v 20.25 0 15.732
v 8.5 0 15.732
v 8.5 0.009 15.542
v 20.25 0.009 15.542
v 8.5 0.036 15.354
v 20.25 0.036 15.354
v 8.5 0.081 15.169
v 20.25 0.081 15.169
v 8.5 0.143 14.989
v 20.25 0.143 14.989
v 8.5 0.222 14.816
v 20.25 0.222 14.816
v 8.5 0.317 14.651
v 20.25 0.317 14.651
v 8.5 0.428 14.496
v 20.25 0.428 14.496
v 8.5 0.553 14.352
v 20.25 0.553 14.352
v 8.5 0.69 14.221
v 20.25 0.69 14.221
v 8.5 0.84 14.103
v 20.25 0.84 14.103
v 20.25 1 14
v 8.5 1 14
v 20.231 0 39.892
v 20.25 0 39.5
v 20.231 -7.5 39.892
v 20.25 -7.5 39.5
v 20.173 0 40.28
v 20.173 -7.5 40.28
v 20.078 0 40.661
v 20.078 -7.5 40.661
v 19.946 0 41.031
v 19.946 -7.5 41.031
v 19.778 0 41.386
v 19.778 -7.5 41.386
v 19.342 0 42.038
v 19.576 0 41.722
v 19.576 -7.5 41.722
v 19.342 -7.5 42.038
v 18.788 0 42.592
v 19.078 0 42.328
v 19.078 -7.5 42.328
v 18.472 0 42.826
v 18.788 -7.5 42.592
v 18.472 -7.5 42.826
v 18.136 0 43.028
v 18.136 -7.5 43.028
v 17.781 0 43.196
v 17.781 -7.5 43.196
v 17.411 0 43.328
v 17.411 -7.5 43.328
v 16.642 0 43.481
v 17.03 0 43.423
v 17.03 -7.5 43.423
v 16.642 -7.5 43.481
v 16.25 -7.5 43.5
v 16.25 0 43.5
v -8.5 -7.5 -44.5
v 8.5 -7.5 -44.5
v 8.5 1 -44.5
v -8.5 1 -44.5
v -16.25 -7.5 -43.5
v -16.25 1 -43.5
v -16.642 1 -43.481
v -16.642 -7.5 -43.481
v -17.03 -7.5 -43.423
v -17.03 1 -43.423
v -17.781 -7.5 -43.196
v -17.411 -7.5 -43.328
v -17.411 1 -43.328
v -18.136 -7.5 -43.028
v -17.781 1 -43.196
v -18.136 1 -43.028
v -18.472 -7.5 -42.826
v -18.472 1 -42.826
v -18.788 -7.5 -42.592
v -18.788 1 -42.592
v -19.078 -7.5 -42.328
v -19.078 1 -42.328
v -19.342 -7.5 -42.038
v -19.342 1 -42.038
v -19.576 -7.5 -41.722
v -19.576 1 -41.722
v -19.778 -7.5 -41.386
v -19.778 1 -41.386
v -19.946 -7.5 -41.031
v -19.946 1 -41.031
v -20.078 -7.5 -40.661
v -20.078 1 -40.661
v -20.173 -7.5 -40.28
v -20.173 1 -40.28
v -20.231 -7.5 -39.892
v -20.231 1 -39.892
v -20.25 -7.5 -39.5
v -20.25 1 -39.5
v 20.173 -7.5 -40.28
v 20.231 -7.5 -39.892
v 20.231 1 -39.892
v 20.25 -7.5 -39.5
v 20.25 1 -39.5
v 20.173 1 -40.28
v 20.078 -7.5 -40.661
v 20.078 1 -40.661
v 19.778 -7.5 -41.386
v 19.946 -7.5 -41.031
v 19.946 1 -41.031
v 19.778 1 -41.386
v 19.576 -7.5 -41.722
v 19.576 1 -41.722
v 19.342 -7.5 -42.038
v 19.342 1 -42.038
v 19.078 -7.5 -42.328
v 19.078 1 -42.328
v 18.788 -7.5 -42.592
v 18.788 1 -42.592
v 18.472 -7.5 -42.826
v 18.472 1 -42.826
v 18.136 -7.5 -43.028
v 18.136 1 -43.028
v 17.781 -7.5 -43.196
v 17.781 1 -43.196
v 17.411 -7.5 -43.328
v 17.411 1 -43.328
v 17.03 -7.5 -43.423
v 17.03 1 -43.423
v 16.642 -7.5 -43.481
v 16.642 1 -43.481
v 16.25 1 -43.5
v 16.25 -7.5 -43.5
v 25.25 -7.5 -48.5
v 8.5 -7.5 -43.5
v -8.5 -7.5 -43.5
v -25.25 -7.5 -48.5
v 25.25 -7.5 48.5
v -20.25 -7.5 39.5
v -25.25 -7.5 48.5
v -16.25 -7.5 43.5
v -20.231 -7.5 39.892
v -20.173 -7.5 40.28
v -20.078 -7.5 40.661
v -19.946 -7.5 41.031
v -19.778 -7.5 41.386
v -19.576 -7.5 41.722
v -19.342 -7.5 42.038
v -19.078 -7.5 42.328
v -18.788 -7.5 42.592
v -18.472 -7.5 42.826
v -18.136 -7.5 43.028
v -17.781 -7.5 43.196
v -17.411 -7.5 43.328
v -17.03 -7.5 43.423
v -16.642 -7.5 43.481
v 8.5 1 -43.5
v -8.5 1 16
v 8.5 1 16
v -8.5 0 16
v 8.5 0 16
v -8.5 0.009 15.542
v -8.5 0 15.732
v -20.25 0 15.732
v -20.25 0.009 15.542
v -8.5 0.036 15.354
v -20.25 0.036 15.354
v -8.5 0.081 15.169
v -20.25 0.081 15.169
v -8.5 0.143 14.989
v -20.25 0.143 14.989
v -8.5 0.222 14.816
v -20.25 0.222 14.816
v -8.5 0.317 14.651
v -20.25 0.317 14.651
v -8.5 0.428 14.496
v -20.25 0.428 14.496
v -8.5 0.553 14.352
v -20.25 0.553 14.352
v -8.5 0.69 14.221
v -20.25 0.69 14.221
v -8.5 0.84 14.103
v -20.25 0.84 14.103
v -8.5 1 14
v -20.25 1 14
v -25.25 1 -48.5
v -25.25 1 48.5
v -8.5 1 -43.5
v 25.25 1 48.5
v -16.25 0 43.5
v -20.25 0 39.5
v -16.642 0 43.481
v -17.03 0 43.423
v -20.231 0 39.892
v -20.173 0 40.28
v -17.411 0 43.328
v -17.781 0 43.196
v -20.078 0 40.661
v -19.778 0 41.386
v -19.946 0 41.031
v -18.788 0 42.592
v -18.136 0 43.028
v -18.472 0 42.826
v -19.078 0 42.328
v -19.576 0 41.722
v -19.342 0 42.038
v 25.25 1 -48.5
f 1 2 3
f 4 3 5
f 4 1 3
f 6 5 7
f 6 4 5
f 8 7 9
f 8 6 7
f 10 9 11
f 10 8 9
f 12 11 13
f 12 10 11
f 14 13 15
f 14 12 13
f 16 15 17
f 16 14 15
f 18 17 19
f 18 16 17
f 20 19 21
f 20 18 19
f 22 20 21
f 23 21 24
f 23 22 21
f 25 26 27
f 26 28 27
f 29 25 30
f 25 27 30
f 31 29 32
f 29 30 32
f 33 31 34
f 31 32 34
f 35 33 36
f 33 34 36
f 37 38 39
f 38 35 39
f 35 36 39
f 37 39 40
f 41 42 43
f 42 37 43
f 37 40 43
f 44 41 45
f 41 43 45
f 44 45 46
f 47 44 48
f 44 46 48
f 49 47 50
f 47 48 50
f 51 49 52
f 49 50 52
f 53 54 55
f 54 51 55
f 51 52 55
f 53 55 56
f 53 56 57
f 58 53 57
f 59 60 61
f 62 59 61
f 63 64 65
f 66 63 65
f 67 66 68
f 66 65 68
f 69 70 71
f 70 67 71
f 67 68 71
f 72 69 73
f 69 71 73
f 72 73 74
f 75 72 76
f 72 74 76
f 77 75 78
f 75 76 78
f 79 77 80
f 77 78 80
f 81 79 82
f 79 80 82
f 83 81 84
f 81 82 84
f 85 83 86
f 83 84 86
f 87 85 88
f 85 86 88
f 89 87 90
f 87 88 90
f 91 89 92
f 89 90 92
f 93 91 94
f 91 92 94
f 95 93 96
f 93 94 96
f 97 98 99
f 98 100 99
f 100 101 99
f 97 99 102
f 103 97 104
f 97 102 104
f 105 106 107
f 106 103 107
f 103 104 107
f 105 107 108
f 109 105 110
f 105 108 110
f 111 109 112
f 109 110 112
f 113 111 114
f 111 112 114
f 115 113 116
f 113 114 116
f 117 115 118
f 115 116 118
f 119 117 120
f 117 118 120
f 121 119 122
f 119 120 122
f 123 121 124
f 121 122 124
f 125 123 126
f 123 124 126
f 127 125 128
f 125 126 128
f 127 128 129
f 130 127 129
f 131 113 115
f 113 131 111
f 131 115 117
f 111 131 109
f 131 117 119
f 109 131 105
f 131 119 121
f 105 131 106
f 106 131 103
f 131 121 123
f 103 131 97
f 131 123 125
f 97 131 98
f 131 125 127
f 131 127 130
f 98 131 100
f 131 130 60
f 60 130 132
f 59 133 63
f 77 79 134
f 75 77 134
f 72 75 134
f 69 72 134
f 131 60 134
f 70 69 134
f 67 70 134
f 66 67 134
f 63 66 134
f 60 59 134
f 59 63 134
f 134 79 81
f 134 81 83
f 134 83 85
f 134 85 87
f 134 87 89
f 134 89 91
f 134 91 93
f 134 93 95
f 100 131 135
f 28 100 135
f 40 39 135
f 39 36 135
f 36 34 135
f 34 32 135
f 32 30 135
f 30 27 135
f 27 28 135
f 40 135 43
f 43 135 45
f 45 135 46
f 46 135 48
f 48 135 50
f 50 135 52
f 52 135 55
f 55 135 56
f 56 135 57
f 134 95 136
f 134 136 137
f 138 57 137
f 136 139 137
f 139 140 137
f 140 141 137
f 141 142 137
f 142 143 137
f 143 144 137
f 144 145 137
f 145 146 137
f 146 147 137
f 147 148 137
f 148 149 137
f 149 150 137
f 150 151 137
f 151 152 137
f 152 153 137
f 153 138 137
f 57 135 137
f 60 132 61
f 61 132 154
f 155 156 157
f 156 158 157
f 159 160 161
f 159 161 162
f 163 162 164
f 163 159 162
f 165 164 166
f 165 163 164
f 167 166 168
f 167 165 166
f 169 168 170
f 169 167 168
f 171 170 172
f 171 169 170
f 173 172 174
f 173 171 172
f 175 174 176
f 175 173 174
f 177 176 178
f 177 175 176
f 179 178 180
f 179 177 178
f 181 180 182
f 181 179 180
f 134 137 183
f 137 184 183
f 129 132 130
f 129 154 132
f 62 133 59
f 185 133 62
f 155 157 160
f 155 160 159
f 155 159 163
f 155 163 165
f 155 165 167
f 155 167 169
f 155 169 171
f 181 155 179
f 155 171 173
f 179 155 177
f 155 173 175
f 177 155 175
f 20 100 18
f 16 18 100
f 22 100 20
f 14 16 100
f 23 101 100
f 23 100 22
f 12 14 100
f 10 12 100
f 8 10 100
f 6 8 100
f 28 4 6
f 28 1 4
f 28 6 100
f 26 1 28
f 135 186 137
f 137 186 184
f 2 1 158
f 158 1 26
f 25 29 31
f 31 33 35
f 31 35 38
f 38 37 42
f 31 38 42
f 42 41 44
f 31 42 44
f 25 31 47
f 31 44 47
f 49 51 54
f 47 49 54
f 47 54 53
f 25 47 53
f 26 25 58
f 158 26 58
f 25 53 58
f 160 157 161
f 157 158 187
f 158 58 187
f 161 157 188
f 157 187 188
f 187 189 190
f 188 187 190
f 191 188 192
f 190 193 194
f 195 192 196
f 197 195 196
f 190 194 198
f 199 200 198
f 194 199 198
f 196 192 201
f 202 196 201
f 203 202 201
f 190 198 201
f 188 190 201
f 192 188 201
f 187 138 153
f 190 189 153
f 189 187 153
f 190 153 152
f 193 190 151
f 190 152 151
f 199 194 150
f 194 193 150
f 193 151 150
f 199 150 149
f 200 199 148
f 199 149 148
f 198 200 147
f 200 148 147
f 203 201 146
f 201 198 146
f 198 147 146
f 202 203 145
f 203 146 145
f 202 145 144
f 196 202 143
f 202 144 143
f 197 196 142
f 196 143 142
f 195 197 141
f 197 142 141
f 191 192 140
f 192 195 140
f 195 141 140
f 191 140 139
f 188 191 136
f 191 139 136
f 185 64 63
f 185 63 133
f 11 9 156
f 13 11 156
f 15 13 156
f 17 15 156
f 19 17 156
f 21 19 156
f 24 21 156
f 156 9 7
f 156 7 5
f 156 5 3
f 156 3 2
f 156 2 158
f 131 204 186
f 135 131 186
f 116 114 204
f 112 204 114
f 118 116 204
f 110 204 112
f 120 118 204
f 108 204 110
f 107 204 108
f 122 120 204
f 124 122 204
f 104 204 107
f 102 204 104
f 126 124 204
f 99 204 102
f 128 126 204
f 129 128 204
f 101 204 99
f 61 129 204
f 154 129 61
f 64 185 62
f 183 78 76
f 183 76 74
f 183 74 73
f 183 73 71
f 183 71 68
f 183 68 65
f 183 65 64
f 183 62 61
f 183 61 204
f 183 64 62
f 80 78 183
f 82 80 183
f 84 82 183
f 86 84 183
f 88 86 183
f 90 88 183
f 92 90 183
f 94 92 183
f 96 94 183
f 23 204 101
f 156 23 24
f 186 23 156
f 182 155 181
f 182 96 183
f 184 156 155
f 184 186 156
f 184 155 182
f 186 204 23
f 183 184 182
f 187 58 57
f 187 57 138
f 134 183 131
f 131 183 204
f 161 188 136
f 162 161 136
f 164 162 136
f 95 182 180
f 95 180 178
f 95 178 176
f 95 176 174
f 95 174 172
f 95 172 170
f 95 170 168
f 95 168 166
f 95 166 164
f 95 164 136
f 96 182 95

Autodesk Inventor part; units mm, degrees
ref_plane "YZ Plane" through (0, 0, 0) normal (1, 0, 0) x (0, 1, 0)
ref_plane "XZ Plane" through (0, 0, 0) normal (0, 1, 0) x (-1, 0, 0)
ref_plane "XY Plane" through (0, 0, 0) normal (0, 0, 1) x (1, 0, 0)
sketch "Boceto1" plane through (0, 0, 0) normal (0, 1, 0) x (-1, 0, 0)
  line L0 (20.25, -43.5) -> (-20.25, -43.5)
  line L1 (-20.25, -43.5) -> (-20.25, 43.5)
  line L2 (-20.25, 43.5) -> (20.25, 43.5)
  line L3 (20.25, 43.5) -> (20.25, -43.5)
  line L4 (20.25, -43.5) -> (-20.25, 43.5) construction
  line L5 (-20.25, -43.5) -> (20.25, 43.5) construction
  line L6 (25.25, -48.5) -> (-25.25, -48.5)
  line L7 (-25.25, -48.5) -> (-25.25, 48.5)
  line L8 (-25.25, 48.5) -> (25.25, 48.5)
  line L9 (25.25, 48.5) -> (25.25, -48.5)
  line L10 (20.25, 43.5) -> (-20.25, 43.5)
  line L11 (-20.25, 43.5) -> (-20.25, 14)
  line L12 (-20.25, 14) -> (20.25, 14)
  line L13 (20.25, 14) -> (20.25, 43.5)
  line L14 (25.25, 14) -> (-25.25, 14)
  line L15 (21.25, -44.5) -> (-21.25, -44.5)
  line L16 (-21.25, -44.5) -> (-21.25, 44.5)
  line L17 (-21.25, 44.5) -> (21.25, 44.5)
  line L18 (21.25, 44.5) -> (21.25, -44.5)
  line L19 (8.5, 14) -> (-8.5, 14)
  line L20 (-8.5, 14) -> (-8.5, 16)
  line L21 (-8.5, 16) -> (8.5, 16)
  line L22 (8.5, 16) -> (8.5, 14)
  point P0 (0, 0)
  point P1 (0, 0)
  point P2 (-20.25, 14)
  point P3 (-20.25, 14)
  point P4 (20.25, 14)
  point P5 (20.25, 14)
  point P6 (0, 14)
  dimension "d0" = 40.5
  dimension "d1" = 87
  dimension "d2" = 5
  dimension "d3" = 29.5
  dimension "d19" = 1
  dimension "d29" = 17
  dimension "d32" = 2
extrude "Extrusión4" add sketch "Boceto1" against normal blind 7.5 contours L3 L14 L18 L15 L16 L1 L0 | L3 L2 L1 L14 L16 L17 L18 | L18 L17 L16 L14 L7 L8 L9 | L14 L9 L6 L7 L16 L15 L18
extrude "Extrusión5" add sketch "Boceto1" along normal blind 1 contours L3 L14 L18 L15 L16 L1 L0 | L12 L22 L21 L20 L1 L2 L3 | L3 L2 L1 L14 L16 L17 L18 | L12 L20 L21 L22 | L18 L17 L16 L14 L7 L8 L9 | L14 L9 L6 L7 L16 L15 L18
fillet "Empalme2" radius 4 4 edges at (-20.25, -3.25, -43.5) (20.25, -3.25, -43.5) (20.25, -3.75, 43.5) (-20.25, -3.75, 43.5)
fillet "Empalme3" radius 2 1 edges at (0, 0, 14)
sketch "Boceto2" plane through (0, 0, 0) normal (1, 0, 0) x (0, 1, 0)
  line L0 (1, 14) -> (1, -39.5) construction
  line L1 (1, 14) -> (4, 14)
  line L2 (4, 14) -> (4, 9)
  line L3 (1, -3.5) -> (11, -3.5) construction
  line L4 (4, 14) -> (11, -3.5)
  line L5 (11, -3.5) -> (9.143, 1.1424)
  line L6 (0, 15) -> (0, -39.5) construction
  line L7 (1, -43.5) -> (1, -39.5) construction
  line L8 (1, -43.5) -> (13, -43.5)
  line L9 (13, -43.5) -> (10.5, -43.5)
  line L10 (1, -43.5) -> (13, -43.5)
  line L11 (13, -43.5) -> (13, -44.5)
  line L12 (13, -44.5) -> (1, -44.5)
  line L13 (1, -44.5) -> (1, -43.5)
  line L14 (10.5, -43.5) -> (10.5, -38.5)
  line L15 (10.5, -38.5) -> (9.5, -38.5)
  line L16 (9.5, -38.5) -> (9.5, -43.5)
  line L17 (9.5, -43.5) -> (10.5, -43.5)
  line L18 (10.5, -43.5) -> (10.5, -38.5)
  line L19 (13, -43.5) -> (13, -3.5) construction
  line L20 (13, -43.5) -> (13, -36.5) construction
  line L21 (13, -36.5) -> (12, -36.5) construction
  line L22 (13, -36.5) -> (13, -43.5)
  line L23 (11, -3.5) -> (13, -36.5)
  line L24 (1, 14) -> (-1, 14)
  line L25 (-1, 14) -> (-1, 43.5)
  line L26 (0, 43.5) -> (-7.5, 43.5) projected
  line L27 (0, 39.5) -> (0, 15.7321) projected
  line L28 (-7.5, 48.5) -> (-7.5, -48.5) construction
  line L29 (1, -43.5) -> (-7.5, -43.5)
  line L30 (-7.5, -43.5) -> (-7.5, -44.5)
  line L31 (-7.5, -44.5) -> (1, -44.5)
  line L32 (1, -44.5) -> (1, -43.5)
  point P0 (0, 0)
  dimension "d22" = 3
  dimension "d23" = 5
  dimension "d24" = 10
  dimension "d25" = 17.5
  dimension "d26" = 5
  dimension "d33" = 12
  dimension "d36" = 1
  dimension "d37" = 5
  dimension "d38" = 1
  dimension "d39" = 40
  dimension "d40" = 7
  dimension "d41" = 1
  dimension "d48" = 1
feature "Barrido1" [suppressed]
extrude "Extrusión7" [suppressed]
extrude "Extrusión8" cut sketch "Boceto1" along normal blind 10 contours L12 L20 L21 L22
extrude "Extrusión9" cut sketch "Boceto2" along normal mid plane 17 contours L13 L31 L30 L29
properties part number "manija_puerta_marco_front_right_v3"
